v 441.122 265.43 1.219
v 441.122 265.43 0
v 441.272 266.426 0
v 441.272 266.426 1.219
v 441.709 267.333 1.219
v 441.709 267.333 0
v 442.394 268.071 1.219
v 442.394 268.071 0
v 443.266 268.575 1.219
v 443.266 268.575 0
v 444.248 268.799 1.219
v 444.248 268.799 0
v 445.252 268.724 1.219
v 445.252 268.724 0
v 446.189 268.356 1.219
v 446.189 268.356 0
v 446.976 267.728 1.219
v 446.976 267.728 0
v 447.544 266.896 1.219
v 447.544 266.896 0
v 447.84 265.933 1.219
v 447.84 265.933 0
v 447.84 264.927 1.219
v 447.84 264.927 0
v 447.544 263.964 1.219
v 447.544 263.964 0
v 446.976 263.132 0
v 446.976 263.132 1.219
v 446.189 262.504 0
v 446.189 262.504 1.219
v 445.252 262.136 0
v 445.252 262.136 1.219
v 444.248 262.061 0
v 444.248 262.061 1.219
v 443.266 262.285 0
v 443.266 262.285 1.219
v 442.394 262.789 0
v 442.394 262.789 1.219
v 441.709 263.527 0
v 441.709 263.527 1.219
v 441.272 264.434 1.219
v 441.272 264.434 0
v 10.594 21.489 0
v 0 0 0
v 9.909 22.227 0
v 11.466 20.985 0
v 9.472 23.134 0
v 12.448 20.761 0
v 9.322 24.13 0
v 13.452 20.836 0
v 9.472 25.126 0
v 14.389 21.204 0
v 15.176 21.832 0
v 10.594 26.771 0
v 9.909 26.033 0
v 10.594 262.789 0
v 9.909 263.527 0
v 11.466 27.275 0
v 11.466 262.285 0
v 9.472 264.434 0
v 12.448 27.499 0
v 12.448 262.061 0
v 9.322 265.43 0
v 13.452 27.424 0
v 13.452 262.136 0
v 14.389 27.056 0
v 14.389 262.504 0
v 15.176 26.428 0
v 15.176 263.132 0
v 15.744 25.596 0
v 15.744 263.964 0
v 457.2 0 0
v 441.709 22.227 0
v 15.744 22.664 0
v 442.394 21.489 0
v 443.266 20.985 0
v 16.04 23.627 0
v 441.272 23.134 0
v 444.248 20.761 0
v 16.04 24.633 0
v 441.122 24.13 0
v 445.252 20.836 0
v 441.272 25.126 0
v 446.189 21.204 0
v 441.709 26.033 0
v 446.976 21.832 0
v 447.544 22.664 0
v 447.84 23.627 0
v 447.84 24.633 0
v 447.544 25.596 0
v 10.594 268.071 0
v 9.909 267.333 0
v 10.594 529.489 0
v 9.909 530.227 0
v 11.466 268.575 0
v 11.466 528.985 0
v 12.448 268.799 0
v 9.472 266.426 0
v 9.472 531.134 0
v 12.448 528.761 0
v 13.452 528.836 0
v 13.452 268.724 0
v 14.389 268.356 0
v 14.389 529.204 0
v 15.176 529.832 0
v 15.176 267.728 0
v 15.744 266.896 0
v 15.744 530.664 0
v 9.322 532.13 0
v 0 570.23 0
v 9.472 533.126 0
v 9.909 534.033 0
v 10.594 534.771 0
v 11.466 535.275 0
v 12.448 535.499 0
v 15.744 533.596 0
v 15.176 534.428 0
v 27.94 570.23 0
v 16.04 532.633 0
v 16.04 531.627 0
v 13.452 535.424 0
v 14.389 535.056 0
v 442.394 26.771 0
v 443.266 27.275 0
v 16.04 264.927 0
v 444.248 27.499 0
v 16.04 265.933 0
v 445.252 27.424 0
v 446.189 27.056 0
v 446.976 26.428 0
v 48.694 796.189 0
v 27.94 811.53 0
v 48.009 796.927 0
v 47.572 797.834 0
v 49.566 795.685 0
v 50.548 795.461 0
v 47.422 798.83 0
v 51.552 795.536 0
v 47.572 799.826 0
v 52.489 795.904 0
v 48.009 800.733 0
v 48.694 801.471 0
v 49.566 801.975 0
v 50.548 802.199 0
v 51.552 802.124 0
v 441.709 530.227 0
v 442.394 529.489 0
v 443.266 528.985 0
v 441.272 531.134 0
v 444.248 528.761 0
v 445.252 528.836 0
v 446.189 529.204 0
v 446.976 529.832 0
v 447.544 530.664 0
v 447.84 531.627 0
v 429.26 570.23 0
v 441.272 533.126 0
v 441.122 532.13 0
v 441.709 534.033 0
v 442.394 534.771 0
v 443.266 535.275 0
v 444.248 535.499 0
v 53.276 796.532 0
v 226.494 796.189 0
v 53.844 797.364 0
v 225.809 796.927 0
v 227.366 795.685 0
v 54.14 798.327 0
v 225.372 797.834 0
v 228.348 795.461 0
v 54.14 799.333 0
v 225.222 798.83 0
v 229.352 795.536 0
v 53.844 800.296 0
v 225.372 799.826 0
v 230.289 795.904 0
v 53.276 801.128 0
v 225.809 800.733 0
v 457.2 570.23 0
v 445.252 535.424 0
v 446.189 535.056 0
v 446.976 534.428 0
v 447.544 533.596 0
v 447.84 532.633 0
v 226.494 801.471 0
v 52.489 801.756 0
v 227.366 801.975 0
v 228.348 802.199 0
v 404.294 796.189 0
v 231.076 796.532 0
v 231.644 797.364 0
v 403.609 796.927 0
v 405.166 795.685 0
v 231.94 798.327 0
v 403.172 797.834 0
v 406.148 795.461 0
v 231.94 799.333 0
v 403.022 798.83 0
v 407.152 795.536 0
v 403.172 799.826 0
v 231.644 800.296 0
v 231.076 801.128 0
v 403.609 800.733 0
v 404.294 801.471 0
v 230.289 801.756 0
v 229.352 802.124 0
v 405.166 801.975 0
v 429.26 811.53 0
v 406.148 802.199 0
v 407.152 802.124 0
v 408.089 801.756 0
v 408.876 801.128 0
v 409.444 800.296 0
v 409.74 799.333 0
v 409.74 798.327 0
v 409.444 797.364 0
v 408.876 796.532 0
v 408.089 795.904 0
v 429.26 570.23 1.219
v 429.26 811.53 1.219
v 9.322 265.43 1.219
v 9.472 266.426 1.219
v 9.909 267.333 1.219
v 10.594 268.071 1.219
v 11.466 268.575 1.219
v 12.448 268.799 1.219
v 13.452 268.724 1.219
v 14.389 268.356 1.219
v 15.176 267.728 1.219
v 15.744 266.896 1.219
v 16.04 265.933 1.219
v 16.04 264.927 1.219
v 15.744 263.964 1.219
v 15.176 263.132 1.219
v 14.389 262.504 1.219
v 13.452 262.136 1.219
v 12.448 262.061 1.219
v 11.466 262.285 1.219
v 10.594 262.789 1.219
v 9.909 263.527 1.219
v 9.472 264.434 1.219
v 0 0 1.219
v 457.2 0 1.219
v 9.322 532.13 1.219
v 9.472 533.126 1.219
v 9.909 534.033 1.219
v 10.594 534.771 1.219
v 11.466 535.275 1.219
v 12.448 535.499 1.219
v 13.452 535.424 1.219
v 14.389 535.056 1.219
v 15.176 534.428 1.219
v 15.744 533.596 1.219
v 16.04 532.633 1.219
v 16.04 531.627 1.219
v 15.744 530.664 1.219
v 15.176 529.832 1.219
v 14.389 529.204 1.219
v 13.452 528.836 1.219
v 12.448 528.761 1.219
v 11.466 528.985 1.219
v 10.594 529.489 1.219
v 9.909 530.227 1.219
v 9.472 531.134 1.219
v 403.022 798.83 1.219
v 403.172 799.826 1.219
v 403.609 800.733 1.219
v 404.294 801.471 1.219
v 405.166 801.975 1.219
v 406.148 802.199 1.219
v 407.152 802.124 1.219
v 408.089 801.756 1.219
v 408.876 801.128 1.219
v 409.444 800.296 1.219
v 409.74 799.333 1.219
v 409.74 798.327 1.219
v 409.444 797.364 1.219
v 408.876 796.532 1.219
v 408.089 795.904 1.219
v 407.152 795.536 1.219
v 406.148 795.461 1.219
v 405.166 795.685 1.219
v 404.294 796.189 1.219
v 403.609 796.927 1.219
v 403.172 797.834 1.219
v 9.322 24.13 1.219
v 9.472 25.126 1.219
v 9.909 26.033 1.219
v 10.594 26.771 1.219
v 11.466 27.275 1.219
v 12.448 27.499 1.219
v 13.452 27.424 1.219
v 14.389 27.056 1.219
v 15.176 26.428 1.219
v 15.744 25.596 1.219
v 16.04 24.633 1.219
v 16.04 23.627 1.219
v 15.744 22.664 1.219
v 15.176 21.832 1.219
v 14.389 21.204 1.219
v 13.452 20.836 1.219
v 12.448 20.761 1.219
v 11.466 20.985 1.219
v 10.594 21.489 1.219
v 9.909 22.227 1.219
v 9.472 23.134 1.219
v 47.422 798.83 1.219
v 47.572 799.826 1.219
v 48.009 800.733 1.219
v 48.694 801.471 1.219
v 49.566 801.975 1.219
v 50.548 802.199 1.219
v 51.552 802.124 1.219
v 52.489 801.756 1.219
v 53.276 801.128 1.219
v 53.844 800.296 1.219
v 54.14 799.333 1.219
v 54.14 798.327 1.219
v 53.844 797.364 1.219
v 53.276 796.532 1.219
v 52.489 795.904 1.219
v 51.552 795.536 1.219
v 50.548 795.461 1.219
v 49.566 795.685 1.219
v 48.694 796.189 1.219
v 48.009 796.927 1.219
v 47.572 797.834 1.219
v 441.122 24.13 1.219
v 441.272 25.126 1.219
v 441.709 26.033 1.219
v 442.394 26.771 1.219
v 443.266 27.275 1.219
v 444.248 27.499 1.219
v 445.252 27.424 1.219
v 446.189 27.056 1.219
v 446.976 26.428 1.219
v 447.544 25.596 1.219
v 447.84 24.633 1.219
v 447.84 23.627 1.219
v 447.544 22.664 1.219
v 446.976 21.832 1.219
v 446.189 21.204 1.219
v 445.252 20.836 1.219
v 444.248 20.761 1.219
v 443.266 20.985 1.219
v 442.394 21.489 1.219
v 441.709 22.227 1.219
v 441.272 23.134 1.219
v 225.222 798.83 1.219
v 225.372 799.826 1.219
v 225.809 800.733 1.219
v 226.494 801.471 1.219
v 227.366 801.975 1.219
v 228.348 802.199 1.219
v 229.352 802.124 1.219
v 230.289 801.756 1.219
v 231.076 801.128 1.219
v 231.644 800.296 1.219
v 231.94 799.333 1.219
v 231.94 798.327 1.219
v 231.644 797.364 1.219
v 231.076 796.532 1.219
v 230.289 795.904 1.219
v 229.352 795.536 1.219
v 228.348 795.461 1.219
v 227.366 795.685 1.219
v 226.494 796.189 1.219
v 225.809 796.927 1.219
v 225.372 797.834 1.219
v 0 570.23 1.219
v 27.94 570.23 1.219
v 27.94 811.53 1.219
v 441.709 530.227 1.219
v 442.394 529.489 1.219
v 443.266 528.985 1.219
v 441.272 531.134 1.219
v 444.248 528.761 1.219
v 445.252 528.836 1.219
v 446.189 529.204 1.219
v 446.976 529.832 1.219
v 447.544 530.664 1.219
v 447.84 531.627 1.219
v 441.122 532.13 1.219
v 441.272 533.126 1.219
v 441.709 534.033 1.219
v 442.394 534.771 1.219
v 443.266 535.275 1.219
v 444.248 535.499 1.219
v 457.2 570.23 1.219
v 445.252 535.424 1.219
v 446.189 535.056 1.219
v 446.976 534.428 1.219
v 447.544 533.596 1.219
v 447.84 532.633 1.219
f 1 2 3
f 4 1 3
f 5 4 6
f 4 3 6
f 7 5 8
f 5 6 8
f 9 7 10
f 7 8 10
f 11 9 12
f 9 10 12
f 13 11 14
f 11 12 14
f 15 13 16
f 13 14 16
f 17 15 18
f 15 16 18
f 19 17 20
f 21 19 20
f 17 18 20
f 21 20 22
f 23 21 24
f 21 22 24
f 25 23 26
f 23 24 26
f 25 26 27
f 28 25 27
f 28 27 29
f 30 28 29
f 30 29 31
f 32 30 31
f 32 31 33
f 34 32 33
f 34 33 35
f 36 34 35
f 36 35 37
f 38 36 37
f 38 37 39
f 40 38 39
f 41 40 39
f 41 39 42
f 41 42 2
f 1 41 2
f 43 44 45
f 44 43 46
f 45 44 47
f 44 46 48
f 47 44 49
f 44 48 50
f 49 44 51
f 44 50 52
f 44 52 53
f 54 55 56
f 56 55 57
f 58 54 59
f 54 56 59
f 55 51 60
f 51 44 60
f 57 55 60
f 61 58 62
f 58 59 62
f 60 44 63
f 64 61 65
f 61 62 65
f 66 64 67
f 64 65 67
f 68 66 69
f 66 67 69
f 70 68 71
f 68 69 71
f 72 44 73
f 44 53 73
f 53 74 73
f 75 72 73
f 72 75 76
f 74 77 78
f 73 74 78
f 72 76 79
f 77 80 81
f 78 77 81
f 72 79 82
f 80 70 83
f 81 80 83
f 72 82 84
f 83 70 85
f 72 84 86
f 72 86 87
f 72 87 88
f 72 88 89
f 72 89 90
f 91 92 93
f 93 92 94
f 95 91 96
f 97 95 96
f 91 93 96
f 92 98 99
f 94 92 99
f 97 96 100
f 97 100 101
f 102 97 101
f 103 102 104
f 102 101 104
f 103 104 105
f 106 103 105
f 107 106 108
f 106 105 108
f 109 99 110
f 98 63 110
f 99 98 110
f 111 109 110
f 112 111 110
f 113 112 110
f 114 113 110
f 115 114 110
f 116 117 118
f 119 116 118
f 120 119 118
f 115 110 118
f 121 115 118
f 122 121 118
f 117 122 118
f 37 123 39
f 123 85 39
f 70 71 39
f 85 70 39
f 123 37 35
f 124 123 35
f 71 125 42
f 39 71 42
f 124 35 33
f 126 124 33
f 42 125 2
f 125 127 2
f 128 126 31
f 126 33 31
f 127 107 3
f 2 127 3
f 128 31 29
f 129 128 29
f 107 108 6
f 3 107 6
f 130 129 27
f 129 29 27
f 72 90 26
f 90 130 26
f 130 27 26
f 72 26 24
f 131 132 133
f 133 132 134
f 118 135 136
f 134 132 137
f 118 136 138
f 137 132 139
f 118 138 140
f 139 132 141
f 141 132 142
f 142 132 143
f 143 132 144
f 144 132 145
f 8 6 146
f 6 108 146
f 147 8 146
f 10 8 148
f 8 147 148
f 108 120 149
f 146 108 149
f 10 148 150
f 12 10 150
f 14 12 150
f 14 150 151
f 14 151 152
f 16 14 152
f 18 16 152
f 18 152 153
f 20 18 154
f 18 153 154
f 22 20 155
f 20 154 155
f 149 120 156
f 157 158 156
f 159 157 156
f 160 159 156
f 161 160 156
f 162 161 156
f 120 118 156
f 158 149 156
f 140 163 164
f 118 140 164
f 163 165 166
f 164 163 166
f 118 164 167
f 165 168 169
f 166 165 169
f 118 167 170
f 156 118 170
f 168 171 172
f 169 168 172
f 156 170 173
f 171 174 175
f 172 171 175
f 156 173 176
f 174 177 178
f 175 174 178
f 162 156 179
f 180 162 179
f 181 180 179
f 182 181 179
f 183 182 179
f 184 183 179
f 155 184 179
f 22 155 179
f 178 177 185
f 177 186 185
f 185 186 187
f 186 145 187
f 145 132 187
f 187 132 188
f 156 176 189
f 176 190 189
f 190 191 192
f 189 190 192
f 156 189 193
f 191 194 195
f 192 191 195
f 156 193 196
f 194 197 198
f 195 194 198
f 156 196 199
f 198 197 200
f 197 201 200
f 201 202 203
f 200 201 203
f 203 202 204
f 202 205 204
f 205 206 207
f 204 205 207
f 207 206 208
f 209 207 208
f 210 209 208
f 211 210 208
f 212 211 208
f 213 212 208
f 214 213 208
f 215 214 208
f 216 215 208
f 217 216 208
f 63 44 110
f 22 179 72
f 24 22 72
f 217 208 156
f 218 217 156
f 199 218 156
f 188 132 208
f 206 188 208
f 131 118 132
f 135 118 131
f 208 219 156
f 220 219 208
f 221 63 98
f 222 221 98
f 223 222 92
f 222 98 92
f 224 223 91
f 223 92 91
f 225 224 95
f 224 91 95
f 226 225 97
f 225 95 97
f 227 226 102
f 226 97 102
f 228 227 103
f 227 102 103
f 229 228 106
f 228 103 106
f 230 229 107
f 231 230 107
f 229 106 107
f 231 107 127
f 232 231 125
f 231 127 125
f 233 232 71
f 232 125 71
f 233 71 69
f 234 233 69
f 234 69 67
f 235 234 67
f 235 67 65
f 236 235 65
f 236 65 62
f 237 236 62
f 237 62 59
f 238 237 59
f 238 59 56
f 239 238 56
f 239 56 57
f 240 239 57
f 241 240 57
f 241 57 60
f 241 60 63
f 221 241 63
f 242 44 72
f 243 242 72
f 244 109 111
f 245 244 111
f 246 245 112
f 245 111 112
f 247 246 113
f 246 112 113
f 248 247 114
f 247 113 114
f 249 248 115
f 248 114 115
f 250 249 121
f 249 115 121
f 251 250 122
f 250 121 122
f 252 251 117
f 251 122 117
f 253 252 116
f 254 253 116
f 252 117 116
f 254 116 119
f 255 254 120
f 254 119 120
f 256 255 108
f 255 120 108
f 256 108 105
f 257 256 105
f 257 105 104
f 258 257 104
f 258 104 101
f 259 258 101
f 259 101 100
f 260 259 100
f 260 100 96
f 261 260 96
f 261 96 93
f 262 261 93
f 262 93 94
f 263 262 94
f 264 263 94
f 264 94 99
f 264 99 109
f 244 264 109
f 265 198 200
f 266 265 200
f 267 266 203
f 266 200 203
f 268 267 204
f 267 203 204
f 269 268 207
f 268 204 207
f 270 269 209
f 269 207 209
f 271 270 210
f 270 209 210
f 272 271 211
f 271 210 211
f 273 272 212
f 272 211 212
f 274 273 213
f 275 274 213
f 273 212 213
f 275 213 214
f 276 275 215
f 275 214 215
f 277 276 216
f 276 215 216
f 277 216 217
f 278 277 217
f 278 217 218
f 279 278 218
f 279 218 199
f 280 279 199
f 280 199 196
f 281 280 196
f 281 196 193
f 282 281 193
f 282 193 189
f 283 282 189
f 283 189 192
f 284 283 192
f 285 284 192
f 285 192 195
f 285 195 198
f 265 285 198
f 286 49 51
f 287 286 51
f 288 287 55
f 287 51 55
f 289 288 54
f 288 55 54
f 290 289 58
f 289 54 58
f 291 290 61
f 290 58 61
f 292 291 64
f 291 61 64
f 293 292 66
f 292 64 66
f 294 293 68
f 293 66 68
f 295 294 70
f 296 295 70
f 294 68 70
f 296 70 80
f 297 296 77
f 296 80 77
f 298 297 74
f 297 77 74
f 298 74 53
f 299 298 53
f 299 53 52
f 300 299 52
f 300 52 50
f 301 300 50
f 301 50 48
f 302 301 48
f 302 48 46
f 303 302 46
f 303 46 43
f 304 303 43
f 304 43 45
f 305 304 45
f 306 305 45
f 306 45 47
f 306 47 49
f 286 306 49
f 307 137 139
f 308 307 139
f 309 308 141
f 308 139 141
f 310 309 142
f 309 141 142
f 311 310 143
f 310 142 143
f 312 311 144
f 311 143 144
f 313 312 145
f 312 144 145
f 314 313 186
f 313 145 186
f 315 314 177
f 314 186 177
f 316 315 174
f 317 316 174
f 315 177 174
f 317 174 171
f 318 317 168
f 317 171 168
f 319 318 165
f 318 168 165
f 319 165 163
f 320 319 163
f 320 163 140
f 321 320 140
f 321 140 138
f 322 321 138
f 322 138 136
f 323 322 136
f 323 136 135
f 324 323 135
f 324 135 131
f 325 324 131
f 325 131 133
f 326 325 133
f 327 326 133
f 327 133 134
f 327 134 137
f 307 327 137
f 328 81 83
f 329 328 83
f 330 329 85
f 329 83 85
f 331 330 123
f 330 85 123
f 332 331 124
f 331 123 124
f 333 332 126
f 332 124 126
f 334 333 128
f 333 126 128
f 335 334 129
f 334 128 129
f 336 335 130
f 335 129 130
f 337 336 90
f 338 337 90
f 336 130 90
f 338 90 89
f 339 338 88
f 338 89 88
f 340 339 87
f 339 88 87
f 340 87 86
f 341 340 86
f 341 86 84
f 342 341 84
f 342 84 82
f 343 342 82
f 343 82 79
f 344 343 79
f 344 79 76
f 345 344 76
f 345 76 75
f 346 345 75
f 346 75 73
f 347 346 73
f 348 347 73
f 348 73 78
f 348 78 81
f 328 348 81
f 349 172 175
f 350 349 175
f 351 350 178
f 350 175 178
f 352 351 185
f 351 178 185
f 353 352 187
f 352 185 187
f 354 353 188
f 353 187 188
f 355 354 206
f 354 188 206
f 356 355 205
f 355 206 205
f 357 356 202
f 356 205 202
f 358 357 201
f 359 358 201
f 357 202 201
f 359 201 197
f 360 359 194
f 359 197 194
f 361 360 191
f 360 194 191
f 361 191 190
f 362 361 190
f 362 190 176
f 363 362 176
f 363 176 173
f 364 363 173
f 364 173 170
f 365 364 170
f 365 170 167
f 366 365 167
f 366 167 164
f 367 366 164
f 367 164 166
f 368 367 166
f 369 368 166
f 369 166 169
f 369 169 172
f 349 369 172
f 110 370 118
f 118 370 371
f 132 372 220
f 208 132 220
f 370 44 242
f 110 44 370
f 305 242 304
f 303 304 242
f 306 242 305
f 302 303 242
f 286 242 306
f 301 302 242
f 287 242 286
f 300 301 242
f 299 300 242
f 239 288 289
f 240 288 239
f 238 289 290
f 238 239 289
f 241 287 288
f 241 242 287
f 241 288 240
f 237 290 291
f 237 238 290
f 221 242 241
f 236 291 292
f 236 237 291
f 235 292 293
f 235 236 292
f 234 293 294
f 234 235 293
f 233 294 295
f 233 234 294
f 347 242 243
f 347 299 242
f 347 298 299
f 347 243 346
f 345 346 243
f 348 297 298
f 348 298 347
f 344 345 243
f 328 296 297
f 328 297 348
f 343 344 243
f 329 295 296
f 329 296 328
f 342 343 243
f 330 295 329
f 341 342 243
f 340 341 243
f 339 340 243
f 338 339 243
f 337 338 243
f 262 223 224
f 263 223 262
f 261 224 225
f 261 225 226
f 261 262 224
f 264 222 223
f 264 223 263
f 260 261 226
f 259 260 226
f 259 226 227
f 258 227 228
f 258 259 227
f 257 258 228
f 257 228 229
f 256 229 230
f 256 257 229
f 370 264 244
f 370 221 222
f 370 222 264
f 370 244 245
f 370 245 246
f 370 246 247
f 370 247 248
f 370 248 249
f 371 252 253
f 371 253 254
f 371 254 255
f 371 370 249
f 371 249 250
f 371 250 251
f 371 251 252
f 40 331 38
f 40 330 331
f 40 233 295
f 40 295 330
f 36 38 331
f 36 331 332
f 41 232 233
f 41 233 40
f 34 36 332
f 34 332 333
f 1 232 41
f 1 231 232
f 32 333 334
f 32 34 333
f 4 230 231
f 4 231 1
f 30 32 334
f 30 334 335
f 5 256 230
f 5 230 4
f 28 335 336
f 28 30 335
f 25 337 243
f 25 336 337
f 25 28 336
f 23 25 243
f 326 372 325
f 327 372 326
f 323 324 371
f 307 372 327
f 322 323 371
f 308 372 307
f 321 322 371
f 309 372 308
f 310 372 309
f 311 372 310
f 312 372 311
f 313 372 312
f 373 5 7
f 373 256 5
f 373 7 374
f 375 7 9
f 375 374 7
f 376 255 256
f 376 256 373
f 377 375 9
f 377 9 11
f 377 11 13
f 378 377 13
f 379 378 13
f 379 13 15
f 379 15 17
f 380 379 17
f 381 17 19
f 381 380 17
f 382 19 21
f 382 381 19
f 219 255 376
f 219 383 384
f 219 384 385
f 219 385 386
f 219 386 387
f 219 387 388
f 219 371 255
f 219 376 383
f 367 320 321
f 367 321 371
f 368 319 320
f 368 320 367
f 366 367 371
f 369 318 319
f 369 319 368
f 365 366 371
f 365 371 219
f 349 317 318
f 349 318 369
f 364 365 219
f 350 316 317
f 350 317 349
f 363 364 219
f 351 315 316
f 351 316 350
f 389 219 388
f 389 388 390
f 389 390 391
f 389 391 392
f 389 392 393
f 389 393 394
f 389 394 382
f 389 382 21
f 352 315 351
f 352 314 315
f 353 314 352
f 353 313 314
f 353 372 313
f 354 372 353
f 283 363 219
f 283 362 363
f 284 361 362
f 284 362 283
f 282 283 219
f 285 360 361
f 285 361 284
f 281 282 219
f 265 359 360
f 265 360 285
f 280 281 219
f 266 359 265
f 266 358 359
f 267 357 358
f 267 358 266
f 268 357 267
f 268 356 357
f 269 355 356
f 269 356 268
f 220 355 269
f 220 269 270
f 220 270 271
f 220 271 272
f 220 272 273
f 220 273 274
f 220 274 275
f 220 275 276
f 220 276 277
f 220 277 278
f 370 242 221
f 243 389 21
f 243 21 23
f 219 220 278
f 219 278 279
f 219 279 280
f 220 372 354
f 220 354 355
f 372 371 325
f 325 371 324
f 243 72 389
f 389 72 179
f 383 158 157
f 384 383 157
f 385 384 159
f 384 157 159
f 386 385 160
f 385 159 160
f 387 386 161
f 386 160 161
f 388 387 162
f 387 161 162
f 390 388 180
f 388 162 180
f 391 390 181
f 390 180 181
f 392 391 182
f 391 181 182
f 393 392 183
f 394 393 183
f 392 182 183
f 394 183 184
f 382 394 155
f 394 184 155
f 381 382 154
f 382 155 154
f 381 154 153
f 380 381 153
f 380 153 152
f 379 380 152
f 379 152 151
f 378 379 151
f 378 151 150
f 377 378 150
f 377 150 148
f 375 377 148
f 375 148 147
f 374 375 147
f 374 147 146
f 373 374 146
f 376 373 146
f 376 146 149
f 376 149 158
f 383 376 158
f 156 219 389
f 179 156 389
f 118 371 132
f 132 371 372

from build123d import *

# Parameters (mm, degrees)
SKETCH1_W               = 457.2
SKETCH1_H               = 840.74
BOSS_EXTRUDE1_DEPTH     = 1.2192
SKETCH5_W               = 27.94
SKETCH5_H               = 241.3
CUT_EXTRUDE1_DEPTH      = 1.2192
F_1_4_CLEARANCE_HOLE2_D = 6.7564


with BuildPart() as part:
    # Sketch1 → Boss-Extrude1 (new body)
    with BuildSketch(Plane.XY):
        with Locations((228.6, 420.37)):
            Rectangle(SKETCH1_W, SKETCH1_H)
    extrude(amount=BOSS_EXTRUDE1_DEPTH)

    # Sketch5 → Cut-Extrude1 (cut)
    with BuildSketch(Plane.XY.offset(1.2192)):
        with Locations((13.97, 690.88)):
            Rectangle(SKETCH5_W, SKETCH5_H)
        Polygon((457.2, 840.74), (0, 840.74), (0, 811.53), (27.94, 811.53), (429.26, 811.53), (457.2, 811.53), align=None)
        with Locations((443.23, 690.88)):
            Rectangle(SKETCH5_W, SKETCH5_H)
    extrude(amount=-CUT_EXTRUDE1_DEPTH, mode=Mode.SUBTRACT)

    # 1/4 Clearance Hole2 (through all)
    with Locations(Plane.XY.offset(1.2192)):
        with Locations((50.8, 798.83), (228.6, 798.83), (406.4, 798.83), (12.7, 532.13), (12.7, 265.43), (12.7, 24.13), (444.5, 24.13), (444.5, 265.43), (444.5, 532.13)):
            Hole(F_1_4_CLEARANCE_HOLE2_D / 2)


solid = part.part
